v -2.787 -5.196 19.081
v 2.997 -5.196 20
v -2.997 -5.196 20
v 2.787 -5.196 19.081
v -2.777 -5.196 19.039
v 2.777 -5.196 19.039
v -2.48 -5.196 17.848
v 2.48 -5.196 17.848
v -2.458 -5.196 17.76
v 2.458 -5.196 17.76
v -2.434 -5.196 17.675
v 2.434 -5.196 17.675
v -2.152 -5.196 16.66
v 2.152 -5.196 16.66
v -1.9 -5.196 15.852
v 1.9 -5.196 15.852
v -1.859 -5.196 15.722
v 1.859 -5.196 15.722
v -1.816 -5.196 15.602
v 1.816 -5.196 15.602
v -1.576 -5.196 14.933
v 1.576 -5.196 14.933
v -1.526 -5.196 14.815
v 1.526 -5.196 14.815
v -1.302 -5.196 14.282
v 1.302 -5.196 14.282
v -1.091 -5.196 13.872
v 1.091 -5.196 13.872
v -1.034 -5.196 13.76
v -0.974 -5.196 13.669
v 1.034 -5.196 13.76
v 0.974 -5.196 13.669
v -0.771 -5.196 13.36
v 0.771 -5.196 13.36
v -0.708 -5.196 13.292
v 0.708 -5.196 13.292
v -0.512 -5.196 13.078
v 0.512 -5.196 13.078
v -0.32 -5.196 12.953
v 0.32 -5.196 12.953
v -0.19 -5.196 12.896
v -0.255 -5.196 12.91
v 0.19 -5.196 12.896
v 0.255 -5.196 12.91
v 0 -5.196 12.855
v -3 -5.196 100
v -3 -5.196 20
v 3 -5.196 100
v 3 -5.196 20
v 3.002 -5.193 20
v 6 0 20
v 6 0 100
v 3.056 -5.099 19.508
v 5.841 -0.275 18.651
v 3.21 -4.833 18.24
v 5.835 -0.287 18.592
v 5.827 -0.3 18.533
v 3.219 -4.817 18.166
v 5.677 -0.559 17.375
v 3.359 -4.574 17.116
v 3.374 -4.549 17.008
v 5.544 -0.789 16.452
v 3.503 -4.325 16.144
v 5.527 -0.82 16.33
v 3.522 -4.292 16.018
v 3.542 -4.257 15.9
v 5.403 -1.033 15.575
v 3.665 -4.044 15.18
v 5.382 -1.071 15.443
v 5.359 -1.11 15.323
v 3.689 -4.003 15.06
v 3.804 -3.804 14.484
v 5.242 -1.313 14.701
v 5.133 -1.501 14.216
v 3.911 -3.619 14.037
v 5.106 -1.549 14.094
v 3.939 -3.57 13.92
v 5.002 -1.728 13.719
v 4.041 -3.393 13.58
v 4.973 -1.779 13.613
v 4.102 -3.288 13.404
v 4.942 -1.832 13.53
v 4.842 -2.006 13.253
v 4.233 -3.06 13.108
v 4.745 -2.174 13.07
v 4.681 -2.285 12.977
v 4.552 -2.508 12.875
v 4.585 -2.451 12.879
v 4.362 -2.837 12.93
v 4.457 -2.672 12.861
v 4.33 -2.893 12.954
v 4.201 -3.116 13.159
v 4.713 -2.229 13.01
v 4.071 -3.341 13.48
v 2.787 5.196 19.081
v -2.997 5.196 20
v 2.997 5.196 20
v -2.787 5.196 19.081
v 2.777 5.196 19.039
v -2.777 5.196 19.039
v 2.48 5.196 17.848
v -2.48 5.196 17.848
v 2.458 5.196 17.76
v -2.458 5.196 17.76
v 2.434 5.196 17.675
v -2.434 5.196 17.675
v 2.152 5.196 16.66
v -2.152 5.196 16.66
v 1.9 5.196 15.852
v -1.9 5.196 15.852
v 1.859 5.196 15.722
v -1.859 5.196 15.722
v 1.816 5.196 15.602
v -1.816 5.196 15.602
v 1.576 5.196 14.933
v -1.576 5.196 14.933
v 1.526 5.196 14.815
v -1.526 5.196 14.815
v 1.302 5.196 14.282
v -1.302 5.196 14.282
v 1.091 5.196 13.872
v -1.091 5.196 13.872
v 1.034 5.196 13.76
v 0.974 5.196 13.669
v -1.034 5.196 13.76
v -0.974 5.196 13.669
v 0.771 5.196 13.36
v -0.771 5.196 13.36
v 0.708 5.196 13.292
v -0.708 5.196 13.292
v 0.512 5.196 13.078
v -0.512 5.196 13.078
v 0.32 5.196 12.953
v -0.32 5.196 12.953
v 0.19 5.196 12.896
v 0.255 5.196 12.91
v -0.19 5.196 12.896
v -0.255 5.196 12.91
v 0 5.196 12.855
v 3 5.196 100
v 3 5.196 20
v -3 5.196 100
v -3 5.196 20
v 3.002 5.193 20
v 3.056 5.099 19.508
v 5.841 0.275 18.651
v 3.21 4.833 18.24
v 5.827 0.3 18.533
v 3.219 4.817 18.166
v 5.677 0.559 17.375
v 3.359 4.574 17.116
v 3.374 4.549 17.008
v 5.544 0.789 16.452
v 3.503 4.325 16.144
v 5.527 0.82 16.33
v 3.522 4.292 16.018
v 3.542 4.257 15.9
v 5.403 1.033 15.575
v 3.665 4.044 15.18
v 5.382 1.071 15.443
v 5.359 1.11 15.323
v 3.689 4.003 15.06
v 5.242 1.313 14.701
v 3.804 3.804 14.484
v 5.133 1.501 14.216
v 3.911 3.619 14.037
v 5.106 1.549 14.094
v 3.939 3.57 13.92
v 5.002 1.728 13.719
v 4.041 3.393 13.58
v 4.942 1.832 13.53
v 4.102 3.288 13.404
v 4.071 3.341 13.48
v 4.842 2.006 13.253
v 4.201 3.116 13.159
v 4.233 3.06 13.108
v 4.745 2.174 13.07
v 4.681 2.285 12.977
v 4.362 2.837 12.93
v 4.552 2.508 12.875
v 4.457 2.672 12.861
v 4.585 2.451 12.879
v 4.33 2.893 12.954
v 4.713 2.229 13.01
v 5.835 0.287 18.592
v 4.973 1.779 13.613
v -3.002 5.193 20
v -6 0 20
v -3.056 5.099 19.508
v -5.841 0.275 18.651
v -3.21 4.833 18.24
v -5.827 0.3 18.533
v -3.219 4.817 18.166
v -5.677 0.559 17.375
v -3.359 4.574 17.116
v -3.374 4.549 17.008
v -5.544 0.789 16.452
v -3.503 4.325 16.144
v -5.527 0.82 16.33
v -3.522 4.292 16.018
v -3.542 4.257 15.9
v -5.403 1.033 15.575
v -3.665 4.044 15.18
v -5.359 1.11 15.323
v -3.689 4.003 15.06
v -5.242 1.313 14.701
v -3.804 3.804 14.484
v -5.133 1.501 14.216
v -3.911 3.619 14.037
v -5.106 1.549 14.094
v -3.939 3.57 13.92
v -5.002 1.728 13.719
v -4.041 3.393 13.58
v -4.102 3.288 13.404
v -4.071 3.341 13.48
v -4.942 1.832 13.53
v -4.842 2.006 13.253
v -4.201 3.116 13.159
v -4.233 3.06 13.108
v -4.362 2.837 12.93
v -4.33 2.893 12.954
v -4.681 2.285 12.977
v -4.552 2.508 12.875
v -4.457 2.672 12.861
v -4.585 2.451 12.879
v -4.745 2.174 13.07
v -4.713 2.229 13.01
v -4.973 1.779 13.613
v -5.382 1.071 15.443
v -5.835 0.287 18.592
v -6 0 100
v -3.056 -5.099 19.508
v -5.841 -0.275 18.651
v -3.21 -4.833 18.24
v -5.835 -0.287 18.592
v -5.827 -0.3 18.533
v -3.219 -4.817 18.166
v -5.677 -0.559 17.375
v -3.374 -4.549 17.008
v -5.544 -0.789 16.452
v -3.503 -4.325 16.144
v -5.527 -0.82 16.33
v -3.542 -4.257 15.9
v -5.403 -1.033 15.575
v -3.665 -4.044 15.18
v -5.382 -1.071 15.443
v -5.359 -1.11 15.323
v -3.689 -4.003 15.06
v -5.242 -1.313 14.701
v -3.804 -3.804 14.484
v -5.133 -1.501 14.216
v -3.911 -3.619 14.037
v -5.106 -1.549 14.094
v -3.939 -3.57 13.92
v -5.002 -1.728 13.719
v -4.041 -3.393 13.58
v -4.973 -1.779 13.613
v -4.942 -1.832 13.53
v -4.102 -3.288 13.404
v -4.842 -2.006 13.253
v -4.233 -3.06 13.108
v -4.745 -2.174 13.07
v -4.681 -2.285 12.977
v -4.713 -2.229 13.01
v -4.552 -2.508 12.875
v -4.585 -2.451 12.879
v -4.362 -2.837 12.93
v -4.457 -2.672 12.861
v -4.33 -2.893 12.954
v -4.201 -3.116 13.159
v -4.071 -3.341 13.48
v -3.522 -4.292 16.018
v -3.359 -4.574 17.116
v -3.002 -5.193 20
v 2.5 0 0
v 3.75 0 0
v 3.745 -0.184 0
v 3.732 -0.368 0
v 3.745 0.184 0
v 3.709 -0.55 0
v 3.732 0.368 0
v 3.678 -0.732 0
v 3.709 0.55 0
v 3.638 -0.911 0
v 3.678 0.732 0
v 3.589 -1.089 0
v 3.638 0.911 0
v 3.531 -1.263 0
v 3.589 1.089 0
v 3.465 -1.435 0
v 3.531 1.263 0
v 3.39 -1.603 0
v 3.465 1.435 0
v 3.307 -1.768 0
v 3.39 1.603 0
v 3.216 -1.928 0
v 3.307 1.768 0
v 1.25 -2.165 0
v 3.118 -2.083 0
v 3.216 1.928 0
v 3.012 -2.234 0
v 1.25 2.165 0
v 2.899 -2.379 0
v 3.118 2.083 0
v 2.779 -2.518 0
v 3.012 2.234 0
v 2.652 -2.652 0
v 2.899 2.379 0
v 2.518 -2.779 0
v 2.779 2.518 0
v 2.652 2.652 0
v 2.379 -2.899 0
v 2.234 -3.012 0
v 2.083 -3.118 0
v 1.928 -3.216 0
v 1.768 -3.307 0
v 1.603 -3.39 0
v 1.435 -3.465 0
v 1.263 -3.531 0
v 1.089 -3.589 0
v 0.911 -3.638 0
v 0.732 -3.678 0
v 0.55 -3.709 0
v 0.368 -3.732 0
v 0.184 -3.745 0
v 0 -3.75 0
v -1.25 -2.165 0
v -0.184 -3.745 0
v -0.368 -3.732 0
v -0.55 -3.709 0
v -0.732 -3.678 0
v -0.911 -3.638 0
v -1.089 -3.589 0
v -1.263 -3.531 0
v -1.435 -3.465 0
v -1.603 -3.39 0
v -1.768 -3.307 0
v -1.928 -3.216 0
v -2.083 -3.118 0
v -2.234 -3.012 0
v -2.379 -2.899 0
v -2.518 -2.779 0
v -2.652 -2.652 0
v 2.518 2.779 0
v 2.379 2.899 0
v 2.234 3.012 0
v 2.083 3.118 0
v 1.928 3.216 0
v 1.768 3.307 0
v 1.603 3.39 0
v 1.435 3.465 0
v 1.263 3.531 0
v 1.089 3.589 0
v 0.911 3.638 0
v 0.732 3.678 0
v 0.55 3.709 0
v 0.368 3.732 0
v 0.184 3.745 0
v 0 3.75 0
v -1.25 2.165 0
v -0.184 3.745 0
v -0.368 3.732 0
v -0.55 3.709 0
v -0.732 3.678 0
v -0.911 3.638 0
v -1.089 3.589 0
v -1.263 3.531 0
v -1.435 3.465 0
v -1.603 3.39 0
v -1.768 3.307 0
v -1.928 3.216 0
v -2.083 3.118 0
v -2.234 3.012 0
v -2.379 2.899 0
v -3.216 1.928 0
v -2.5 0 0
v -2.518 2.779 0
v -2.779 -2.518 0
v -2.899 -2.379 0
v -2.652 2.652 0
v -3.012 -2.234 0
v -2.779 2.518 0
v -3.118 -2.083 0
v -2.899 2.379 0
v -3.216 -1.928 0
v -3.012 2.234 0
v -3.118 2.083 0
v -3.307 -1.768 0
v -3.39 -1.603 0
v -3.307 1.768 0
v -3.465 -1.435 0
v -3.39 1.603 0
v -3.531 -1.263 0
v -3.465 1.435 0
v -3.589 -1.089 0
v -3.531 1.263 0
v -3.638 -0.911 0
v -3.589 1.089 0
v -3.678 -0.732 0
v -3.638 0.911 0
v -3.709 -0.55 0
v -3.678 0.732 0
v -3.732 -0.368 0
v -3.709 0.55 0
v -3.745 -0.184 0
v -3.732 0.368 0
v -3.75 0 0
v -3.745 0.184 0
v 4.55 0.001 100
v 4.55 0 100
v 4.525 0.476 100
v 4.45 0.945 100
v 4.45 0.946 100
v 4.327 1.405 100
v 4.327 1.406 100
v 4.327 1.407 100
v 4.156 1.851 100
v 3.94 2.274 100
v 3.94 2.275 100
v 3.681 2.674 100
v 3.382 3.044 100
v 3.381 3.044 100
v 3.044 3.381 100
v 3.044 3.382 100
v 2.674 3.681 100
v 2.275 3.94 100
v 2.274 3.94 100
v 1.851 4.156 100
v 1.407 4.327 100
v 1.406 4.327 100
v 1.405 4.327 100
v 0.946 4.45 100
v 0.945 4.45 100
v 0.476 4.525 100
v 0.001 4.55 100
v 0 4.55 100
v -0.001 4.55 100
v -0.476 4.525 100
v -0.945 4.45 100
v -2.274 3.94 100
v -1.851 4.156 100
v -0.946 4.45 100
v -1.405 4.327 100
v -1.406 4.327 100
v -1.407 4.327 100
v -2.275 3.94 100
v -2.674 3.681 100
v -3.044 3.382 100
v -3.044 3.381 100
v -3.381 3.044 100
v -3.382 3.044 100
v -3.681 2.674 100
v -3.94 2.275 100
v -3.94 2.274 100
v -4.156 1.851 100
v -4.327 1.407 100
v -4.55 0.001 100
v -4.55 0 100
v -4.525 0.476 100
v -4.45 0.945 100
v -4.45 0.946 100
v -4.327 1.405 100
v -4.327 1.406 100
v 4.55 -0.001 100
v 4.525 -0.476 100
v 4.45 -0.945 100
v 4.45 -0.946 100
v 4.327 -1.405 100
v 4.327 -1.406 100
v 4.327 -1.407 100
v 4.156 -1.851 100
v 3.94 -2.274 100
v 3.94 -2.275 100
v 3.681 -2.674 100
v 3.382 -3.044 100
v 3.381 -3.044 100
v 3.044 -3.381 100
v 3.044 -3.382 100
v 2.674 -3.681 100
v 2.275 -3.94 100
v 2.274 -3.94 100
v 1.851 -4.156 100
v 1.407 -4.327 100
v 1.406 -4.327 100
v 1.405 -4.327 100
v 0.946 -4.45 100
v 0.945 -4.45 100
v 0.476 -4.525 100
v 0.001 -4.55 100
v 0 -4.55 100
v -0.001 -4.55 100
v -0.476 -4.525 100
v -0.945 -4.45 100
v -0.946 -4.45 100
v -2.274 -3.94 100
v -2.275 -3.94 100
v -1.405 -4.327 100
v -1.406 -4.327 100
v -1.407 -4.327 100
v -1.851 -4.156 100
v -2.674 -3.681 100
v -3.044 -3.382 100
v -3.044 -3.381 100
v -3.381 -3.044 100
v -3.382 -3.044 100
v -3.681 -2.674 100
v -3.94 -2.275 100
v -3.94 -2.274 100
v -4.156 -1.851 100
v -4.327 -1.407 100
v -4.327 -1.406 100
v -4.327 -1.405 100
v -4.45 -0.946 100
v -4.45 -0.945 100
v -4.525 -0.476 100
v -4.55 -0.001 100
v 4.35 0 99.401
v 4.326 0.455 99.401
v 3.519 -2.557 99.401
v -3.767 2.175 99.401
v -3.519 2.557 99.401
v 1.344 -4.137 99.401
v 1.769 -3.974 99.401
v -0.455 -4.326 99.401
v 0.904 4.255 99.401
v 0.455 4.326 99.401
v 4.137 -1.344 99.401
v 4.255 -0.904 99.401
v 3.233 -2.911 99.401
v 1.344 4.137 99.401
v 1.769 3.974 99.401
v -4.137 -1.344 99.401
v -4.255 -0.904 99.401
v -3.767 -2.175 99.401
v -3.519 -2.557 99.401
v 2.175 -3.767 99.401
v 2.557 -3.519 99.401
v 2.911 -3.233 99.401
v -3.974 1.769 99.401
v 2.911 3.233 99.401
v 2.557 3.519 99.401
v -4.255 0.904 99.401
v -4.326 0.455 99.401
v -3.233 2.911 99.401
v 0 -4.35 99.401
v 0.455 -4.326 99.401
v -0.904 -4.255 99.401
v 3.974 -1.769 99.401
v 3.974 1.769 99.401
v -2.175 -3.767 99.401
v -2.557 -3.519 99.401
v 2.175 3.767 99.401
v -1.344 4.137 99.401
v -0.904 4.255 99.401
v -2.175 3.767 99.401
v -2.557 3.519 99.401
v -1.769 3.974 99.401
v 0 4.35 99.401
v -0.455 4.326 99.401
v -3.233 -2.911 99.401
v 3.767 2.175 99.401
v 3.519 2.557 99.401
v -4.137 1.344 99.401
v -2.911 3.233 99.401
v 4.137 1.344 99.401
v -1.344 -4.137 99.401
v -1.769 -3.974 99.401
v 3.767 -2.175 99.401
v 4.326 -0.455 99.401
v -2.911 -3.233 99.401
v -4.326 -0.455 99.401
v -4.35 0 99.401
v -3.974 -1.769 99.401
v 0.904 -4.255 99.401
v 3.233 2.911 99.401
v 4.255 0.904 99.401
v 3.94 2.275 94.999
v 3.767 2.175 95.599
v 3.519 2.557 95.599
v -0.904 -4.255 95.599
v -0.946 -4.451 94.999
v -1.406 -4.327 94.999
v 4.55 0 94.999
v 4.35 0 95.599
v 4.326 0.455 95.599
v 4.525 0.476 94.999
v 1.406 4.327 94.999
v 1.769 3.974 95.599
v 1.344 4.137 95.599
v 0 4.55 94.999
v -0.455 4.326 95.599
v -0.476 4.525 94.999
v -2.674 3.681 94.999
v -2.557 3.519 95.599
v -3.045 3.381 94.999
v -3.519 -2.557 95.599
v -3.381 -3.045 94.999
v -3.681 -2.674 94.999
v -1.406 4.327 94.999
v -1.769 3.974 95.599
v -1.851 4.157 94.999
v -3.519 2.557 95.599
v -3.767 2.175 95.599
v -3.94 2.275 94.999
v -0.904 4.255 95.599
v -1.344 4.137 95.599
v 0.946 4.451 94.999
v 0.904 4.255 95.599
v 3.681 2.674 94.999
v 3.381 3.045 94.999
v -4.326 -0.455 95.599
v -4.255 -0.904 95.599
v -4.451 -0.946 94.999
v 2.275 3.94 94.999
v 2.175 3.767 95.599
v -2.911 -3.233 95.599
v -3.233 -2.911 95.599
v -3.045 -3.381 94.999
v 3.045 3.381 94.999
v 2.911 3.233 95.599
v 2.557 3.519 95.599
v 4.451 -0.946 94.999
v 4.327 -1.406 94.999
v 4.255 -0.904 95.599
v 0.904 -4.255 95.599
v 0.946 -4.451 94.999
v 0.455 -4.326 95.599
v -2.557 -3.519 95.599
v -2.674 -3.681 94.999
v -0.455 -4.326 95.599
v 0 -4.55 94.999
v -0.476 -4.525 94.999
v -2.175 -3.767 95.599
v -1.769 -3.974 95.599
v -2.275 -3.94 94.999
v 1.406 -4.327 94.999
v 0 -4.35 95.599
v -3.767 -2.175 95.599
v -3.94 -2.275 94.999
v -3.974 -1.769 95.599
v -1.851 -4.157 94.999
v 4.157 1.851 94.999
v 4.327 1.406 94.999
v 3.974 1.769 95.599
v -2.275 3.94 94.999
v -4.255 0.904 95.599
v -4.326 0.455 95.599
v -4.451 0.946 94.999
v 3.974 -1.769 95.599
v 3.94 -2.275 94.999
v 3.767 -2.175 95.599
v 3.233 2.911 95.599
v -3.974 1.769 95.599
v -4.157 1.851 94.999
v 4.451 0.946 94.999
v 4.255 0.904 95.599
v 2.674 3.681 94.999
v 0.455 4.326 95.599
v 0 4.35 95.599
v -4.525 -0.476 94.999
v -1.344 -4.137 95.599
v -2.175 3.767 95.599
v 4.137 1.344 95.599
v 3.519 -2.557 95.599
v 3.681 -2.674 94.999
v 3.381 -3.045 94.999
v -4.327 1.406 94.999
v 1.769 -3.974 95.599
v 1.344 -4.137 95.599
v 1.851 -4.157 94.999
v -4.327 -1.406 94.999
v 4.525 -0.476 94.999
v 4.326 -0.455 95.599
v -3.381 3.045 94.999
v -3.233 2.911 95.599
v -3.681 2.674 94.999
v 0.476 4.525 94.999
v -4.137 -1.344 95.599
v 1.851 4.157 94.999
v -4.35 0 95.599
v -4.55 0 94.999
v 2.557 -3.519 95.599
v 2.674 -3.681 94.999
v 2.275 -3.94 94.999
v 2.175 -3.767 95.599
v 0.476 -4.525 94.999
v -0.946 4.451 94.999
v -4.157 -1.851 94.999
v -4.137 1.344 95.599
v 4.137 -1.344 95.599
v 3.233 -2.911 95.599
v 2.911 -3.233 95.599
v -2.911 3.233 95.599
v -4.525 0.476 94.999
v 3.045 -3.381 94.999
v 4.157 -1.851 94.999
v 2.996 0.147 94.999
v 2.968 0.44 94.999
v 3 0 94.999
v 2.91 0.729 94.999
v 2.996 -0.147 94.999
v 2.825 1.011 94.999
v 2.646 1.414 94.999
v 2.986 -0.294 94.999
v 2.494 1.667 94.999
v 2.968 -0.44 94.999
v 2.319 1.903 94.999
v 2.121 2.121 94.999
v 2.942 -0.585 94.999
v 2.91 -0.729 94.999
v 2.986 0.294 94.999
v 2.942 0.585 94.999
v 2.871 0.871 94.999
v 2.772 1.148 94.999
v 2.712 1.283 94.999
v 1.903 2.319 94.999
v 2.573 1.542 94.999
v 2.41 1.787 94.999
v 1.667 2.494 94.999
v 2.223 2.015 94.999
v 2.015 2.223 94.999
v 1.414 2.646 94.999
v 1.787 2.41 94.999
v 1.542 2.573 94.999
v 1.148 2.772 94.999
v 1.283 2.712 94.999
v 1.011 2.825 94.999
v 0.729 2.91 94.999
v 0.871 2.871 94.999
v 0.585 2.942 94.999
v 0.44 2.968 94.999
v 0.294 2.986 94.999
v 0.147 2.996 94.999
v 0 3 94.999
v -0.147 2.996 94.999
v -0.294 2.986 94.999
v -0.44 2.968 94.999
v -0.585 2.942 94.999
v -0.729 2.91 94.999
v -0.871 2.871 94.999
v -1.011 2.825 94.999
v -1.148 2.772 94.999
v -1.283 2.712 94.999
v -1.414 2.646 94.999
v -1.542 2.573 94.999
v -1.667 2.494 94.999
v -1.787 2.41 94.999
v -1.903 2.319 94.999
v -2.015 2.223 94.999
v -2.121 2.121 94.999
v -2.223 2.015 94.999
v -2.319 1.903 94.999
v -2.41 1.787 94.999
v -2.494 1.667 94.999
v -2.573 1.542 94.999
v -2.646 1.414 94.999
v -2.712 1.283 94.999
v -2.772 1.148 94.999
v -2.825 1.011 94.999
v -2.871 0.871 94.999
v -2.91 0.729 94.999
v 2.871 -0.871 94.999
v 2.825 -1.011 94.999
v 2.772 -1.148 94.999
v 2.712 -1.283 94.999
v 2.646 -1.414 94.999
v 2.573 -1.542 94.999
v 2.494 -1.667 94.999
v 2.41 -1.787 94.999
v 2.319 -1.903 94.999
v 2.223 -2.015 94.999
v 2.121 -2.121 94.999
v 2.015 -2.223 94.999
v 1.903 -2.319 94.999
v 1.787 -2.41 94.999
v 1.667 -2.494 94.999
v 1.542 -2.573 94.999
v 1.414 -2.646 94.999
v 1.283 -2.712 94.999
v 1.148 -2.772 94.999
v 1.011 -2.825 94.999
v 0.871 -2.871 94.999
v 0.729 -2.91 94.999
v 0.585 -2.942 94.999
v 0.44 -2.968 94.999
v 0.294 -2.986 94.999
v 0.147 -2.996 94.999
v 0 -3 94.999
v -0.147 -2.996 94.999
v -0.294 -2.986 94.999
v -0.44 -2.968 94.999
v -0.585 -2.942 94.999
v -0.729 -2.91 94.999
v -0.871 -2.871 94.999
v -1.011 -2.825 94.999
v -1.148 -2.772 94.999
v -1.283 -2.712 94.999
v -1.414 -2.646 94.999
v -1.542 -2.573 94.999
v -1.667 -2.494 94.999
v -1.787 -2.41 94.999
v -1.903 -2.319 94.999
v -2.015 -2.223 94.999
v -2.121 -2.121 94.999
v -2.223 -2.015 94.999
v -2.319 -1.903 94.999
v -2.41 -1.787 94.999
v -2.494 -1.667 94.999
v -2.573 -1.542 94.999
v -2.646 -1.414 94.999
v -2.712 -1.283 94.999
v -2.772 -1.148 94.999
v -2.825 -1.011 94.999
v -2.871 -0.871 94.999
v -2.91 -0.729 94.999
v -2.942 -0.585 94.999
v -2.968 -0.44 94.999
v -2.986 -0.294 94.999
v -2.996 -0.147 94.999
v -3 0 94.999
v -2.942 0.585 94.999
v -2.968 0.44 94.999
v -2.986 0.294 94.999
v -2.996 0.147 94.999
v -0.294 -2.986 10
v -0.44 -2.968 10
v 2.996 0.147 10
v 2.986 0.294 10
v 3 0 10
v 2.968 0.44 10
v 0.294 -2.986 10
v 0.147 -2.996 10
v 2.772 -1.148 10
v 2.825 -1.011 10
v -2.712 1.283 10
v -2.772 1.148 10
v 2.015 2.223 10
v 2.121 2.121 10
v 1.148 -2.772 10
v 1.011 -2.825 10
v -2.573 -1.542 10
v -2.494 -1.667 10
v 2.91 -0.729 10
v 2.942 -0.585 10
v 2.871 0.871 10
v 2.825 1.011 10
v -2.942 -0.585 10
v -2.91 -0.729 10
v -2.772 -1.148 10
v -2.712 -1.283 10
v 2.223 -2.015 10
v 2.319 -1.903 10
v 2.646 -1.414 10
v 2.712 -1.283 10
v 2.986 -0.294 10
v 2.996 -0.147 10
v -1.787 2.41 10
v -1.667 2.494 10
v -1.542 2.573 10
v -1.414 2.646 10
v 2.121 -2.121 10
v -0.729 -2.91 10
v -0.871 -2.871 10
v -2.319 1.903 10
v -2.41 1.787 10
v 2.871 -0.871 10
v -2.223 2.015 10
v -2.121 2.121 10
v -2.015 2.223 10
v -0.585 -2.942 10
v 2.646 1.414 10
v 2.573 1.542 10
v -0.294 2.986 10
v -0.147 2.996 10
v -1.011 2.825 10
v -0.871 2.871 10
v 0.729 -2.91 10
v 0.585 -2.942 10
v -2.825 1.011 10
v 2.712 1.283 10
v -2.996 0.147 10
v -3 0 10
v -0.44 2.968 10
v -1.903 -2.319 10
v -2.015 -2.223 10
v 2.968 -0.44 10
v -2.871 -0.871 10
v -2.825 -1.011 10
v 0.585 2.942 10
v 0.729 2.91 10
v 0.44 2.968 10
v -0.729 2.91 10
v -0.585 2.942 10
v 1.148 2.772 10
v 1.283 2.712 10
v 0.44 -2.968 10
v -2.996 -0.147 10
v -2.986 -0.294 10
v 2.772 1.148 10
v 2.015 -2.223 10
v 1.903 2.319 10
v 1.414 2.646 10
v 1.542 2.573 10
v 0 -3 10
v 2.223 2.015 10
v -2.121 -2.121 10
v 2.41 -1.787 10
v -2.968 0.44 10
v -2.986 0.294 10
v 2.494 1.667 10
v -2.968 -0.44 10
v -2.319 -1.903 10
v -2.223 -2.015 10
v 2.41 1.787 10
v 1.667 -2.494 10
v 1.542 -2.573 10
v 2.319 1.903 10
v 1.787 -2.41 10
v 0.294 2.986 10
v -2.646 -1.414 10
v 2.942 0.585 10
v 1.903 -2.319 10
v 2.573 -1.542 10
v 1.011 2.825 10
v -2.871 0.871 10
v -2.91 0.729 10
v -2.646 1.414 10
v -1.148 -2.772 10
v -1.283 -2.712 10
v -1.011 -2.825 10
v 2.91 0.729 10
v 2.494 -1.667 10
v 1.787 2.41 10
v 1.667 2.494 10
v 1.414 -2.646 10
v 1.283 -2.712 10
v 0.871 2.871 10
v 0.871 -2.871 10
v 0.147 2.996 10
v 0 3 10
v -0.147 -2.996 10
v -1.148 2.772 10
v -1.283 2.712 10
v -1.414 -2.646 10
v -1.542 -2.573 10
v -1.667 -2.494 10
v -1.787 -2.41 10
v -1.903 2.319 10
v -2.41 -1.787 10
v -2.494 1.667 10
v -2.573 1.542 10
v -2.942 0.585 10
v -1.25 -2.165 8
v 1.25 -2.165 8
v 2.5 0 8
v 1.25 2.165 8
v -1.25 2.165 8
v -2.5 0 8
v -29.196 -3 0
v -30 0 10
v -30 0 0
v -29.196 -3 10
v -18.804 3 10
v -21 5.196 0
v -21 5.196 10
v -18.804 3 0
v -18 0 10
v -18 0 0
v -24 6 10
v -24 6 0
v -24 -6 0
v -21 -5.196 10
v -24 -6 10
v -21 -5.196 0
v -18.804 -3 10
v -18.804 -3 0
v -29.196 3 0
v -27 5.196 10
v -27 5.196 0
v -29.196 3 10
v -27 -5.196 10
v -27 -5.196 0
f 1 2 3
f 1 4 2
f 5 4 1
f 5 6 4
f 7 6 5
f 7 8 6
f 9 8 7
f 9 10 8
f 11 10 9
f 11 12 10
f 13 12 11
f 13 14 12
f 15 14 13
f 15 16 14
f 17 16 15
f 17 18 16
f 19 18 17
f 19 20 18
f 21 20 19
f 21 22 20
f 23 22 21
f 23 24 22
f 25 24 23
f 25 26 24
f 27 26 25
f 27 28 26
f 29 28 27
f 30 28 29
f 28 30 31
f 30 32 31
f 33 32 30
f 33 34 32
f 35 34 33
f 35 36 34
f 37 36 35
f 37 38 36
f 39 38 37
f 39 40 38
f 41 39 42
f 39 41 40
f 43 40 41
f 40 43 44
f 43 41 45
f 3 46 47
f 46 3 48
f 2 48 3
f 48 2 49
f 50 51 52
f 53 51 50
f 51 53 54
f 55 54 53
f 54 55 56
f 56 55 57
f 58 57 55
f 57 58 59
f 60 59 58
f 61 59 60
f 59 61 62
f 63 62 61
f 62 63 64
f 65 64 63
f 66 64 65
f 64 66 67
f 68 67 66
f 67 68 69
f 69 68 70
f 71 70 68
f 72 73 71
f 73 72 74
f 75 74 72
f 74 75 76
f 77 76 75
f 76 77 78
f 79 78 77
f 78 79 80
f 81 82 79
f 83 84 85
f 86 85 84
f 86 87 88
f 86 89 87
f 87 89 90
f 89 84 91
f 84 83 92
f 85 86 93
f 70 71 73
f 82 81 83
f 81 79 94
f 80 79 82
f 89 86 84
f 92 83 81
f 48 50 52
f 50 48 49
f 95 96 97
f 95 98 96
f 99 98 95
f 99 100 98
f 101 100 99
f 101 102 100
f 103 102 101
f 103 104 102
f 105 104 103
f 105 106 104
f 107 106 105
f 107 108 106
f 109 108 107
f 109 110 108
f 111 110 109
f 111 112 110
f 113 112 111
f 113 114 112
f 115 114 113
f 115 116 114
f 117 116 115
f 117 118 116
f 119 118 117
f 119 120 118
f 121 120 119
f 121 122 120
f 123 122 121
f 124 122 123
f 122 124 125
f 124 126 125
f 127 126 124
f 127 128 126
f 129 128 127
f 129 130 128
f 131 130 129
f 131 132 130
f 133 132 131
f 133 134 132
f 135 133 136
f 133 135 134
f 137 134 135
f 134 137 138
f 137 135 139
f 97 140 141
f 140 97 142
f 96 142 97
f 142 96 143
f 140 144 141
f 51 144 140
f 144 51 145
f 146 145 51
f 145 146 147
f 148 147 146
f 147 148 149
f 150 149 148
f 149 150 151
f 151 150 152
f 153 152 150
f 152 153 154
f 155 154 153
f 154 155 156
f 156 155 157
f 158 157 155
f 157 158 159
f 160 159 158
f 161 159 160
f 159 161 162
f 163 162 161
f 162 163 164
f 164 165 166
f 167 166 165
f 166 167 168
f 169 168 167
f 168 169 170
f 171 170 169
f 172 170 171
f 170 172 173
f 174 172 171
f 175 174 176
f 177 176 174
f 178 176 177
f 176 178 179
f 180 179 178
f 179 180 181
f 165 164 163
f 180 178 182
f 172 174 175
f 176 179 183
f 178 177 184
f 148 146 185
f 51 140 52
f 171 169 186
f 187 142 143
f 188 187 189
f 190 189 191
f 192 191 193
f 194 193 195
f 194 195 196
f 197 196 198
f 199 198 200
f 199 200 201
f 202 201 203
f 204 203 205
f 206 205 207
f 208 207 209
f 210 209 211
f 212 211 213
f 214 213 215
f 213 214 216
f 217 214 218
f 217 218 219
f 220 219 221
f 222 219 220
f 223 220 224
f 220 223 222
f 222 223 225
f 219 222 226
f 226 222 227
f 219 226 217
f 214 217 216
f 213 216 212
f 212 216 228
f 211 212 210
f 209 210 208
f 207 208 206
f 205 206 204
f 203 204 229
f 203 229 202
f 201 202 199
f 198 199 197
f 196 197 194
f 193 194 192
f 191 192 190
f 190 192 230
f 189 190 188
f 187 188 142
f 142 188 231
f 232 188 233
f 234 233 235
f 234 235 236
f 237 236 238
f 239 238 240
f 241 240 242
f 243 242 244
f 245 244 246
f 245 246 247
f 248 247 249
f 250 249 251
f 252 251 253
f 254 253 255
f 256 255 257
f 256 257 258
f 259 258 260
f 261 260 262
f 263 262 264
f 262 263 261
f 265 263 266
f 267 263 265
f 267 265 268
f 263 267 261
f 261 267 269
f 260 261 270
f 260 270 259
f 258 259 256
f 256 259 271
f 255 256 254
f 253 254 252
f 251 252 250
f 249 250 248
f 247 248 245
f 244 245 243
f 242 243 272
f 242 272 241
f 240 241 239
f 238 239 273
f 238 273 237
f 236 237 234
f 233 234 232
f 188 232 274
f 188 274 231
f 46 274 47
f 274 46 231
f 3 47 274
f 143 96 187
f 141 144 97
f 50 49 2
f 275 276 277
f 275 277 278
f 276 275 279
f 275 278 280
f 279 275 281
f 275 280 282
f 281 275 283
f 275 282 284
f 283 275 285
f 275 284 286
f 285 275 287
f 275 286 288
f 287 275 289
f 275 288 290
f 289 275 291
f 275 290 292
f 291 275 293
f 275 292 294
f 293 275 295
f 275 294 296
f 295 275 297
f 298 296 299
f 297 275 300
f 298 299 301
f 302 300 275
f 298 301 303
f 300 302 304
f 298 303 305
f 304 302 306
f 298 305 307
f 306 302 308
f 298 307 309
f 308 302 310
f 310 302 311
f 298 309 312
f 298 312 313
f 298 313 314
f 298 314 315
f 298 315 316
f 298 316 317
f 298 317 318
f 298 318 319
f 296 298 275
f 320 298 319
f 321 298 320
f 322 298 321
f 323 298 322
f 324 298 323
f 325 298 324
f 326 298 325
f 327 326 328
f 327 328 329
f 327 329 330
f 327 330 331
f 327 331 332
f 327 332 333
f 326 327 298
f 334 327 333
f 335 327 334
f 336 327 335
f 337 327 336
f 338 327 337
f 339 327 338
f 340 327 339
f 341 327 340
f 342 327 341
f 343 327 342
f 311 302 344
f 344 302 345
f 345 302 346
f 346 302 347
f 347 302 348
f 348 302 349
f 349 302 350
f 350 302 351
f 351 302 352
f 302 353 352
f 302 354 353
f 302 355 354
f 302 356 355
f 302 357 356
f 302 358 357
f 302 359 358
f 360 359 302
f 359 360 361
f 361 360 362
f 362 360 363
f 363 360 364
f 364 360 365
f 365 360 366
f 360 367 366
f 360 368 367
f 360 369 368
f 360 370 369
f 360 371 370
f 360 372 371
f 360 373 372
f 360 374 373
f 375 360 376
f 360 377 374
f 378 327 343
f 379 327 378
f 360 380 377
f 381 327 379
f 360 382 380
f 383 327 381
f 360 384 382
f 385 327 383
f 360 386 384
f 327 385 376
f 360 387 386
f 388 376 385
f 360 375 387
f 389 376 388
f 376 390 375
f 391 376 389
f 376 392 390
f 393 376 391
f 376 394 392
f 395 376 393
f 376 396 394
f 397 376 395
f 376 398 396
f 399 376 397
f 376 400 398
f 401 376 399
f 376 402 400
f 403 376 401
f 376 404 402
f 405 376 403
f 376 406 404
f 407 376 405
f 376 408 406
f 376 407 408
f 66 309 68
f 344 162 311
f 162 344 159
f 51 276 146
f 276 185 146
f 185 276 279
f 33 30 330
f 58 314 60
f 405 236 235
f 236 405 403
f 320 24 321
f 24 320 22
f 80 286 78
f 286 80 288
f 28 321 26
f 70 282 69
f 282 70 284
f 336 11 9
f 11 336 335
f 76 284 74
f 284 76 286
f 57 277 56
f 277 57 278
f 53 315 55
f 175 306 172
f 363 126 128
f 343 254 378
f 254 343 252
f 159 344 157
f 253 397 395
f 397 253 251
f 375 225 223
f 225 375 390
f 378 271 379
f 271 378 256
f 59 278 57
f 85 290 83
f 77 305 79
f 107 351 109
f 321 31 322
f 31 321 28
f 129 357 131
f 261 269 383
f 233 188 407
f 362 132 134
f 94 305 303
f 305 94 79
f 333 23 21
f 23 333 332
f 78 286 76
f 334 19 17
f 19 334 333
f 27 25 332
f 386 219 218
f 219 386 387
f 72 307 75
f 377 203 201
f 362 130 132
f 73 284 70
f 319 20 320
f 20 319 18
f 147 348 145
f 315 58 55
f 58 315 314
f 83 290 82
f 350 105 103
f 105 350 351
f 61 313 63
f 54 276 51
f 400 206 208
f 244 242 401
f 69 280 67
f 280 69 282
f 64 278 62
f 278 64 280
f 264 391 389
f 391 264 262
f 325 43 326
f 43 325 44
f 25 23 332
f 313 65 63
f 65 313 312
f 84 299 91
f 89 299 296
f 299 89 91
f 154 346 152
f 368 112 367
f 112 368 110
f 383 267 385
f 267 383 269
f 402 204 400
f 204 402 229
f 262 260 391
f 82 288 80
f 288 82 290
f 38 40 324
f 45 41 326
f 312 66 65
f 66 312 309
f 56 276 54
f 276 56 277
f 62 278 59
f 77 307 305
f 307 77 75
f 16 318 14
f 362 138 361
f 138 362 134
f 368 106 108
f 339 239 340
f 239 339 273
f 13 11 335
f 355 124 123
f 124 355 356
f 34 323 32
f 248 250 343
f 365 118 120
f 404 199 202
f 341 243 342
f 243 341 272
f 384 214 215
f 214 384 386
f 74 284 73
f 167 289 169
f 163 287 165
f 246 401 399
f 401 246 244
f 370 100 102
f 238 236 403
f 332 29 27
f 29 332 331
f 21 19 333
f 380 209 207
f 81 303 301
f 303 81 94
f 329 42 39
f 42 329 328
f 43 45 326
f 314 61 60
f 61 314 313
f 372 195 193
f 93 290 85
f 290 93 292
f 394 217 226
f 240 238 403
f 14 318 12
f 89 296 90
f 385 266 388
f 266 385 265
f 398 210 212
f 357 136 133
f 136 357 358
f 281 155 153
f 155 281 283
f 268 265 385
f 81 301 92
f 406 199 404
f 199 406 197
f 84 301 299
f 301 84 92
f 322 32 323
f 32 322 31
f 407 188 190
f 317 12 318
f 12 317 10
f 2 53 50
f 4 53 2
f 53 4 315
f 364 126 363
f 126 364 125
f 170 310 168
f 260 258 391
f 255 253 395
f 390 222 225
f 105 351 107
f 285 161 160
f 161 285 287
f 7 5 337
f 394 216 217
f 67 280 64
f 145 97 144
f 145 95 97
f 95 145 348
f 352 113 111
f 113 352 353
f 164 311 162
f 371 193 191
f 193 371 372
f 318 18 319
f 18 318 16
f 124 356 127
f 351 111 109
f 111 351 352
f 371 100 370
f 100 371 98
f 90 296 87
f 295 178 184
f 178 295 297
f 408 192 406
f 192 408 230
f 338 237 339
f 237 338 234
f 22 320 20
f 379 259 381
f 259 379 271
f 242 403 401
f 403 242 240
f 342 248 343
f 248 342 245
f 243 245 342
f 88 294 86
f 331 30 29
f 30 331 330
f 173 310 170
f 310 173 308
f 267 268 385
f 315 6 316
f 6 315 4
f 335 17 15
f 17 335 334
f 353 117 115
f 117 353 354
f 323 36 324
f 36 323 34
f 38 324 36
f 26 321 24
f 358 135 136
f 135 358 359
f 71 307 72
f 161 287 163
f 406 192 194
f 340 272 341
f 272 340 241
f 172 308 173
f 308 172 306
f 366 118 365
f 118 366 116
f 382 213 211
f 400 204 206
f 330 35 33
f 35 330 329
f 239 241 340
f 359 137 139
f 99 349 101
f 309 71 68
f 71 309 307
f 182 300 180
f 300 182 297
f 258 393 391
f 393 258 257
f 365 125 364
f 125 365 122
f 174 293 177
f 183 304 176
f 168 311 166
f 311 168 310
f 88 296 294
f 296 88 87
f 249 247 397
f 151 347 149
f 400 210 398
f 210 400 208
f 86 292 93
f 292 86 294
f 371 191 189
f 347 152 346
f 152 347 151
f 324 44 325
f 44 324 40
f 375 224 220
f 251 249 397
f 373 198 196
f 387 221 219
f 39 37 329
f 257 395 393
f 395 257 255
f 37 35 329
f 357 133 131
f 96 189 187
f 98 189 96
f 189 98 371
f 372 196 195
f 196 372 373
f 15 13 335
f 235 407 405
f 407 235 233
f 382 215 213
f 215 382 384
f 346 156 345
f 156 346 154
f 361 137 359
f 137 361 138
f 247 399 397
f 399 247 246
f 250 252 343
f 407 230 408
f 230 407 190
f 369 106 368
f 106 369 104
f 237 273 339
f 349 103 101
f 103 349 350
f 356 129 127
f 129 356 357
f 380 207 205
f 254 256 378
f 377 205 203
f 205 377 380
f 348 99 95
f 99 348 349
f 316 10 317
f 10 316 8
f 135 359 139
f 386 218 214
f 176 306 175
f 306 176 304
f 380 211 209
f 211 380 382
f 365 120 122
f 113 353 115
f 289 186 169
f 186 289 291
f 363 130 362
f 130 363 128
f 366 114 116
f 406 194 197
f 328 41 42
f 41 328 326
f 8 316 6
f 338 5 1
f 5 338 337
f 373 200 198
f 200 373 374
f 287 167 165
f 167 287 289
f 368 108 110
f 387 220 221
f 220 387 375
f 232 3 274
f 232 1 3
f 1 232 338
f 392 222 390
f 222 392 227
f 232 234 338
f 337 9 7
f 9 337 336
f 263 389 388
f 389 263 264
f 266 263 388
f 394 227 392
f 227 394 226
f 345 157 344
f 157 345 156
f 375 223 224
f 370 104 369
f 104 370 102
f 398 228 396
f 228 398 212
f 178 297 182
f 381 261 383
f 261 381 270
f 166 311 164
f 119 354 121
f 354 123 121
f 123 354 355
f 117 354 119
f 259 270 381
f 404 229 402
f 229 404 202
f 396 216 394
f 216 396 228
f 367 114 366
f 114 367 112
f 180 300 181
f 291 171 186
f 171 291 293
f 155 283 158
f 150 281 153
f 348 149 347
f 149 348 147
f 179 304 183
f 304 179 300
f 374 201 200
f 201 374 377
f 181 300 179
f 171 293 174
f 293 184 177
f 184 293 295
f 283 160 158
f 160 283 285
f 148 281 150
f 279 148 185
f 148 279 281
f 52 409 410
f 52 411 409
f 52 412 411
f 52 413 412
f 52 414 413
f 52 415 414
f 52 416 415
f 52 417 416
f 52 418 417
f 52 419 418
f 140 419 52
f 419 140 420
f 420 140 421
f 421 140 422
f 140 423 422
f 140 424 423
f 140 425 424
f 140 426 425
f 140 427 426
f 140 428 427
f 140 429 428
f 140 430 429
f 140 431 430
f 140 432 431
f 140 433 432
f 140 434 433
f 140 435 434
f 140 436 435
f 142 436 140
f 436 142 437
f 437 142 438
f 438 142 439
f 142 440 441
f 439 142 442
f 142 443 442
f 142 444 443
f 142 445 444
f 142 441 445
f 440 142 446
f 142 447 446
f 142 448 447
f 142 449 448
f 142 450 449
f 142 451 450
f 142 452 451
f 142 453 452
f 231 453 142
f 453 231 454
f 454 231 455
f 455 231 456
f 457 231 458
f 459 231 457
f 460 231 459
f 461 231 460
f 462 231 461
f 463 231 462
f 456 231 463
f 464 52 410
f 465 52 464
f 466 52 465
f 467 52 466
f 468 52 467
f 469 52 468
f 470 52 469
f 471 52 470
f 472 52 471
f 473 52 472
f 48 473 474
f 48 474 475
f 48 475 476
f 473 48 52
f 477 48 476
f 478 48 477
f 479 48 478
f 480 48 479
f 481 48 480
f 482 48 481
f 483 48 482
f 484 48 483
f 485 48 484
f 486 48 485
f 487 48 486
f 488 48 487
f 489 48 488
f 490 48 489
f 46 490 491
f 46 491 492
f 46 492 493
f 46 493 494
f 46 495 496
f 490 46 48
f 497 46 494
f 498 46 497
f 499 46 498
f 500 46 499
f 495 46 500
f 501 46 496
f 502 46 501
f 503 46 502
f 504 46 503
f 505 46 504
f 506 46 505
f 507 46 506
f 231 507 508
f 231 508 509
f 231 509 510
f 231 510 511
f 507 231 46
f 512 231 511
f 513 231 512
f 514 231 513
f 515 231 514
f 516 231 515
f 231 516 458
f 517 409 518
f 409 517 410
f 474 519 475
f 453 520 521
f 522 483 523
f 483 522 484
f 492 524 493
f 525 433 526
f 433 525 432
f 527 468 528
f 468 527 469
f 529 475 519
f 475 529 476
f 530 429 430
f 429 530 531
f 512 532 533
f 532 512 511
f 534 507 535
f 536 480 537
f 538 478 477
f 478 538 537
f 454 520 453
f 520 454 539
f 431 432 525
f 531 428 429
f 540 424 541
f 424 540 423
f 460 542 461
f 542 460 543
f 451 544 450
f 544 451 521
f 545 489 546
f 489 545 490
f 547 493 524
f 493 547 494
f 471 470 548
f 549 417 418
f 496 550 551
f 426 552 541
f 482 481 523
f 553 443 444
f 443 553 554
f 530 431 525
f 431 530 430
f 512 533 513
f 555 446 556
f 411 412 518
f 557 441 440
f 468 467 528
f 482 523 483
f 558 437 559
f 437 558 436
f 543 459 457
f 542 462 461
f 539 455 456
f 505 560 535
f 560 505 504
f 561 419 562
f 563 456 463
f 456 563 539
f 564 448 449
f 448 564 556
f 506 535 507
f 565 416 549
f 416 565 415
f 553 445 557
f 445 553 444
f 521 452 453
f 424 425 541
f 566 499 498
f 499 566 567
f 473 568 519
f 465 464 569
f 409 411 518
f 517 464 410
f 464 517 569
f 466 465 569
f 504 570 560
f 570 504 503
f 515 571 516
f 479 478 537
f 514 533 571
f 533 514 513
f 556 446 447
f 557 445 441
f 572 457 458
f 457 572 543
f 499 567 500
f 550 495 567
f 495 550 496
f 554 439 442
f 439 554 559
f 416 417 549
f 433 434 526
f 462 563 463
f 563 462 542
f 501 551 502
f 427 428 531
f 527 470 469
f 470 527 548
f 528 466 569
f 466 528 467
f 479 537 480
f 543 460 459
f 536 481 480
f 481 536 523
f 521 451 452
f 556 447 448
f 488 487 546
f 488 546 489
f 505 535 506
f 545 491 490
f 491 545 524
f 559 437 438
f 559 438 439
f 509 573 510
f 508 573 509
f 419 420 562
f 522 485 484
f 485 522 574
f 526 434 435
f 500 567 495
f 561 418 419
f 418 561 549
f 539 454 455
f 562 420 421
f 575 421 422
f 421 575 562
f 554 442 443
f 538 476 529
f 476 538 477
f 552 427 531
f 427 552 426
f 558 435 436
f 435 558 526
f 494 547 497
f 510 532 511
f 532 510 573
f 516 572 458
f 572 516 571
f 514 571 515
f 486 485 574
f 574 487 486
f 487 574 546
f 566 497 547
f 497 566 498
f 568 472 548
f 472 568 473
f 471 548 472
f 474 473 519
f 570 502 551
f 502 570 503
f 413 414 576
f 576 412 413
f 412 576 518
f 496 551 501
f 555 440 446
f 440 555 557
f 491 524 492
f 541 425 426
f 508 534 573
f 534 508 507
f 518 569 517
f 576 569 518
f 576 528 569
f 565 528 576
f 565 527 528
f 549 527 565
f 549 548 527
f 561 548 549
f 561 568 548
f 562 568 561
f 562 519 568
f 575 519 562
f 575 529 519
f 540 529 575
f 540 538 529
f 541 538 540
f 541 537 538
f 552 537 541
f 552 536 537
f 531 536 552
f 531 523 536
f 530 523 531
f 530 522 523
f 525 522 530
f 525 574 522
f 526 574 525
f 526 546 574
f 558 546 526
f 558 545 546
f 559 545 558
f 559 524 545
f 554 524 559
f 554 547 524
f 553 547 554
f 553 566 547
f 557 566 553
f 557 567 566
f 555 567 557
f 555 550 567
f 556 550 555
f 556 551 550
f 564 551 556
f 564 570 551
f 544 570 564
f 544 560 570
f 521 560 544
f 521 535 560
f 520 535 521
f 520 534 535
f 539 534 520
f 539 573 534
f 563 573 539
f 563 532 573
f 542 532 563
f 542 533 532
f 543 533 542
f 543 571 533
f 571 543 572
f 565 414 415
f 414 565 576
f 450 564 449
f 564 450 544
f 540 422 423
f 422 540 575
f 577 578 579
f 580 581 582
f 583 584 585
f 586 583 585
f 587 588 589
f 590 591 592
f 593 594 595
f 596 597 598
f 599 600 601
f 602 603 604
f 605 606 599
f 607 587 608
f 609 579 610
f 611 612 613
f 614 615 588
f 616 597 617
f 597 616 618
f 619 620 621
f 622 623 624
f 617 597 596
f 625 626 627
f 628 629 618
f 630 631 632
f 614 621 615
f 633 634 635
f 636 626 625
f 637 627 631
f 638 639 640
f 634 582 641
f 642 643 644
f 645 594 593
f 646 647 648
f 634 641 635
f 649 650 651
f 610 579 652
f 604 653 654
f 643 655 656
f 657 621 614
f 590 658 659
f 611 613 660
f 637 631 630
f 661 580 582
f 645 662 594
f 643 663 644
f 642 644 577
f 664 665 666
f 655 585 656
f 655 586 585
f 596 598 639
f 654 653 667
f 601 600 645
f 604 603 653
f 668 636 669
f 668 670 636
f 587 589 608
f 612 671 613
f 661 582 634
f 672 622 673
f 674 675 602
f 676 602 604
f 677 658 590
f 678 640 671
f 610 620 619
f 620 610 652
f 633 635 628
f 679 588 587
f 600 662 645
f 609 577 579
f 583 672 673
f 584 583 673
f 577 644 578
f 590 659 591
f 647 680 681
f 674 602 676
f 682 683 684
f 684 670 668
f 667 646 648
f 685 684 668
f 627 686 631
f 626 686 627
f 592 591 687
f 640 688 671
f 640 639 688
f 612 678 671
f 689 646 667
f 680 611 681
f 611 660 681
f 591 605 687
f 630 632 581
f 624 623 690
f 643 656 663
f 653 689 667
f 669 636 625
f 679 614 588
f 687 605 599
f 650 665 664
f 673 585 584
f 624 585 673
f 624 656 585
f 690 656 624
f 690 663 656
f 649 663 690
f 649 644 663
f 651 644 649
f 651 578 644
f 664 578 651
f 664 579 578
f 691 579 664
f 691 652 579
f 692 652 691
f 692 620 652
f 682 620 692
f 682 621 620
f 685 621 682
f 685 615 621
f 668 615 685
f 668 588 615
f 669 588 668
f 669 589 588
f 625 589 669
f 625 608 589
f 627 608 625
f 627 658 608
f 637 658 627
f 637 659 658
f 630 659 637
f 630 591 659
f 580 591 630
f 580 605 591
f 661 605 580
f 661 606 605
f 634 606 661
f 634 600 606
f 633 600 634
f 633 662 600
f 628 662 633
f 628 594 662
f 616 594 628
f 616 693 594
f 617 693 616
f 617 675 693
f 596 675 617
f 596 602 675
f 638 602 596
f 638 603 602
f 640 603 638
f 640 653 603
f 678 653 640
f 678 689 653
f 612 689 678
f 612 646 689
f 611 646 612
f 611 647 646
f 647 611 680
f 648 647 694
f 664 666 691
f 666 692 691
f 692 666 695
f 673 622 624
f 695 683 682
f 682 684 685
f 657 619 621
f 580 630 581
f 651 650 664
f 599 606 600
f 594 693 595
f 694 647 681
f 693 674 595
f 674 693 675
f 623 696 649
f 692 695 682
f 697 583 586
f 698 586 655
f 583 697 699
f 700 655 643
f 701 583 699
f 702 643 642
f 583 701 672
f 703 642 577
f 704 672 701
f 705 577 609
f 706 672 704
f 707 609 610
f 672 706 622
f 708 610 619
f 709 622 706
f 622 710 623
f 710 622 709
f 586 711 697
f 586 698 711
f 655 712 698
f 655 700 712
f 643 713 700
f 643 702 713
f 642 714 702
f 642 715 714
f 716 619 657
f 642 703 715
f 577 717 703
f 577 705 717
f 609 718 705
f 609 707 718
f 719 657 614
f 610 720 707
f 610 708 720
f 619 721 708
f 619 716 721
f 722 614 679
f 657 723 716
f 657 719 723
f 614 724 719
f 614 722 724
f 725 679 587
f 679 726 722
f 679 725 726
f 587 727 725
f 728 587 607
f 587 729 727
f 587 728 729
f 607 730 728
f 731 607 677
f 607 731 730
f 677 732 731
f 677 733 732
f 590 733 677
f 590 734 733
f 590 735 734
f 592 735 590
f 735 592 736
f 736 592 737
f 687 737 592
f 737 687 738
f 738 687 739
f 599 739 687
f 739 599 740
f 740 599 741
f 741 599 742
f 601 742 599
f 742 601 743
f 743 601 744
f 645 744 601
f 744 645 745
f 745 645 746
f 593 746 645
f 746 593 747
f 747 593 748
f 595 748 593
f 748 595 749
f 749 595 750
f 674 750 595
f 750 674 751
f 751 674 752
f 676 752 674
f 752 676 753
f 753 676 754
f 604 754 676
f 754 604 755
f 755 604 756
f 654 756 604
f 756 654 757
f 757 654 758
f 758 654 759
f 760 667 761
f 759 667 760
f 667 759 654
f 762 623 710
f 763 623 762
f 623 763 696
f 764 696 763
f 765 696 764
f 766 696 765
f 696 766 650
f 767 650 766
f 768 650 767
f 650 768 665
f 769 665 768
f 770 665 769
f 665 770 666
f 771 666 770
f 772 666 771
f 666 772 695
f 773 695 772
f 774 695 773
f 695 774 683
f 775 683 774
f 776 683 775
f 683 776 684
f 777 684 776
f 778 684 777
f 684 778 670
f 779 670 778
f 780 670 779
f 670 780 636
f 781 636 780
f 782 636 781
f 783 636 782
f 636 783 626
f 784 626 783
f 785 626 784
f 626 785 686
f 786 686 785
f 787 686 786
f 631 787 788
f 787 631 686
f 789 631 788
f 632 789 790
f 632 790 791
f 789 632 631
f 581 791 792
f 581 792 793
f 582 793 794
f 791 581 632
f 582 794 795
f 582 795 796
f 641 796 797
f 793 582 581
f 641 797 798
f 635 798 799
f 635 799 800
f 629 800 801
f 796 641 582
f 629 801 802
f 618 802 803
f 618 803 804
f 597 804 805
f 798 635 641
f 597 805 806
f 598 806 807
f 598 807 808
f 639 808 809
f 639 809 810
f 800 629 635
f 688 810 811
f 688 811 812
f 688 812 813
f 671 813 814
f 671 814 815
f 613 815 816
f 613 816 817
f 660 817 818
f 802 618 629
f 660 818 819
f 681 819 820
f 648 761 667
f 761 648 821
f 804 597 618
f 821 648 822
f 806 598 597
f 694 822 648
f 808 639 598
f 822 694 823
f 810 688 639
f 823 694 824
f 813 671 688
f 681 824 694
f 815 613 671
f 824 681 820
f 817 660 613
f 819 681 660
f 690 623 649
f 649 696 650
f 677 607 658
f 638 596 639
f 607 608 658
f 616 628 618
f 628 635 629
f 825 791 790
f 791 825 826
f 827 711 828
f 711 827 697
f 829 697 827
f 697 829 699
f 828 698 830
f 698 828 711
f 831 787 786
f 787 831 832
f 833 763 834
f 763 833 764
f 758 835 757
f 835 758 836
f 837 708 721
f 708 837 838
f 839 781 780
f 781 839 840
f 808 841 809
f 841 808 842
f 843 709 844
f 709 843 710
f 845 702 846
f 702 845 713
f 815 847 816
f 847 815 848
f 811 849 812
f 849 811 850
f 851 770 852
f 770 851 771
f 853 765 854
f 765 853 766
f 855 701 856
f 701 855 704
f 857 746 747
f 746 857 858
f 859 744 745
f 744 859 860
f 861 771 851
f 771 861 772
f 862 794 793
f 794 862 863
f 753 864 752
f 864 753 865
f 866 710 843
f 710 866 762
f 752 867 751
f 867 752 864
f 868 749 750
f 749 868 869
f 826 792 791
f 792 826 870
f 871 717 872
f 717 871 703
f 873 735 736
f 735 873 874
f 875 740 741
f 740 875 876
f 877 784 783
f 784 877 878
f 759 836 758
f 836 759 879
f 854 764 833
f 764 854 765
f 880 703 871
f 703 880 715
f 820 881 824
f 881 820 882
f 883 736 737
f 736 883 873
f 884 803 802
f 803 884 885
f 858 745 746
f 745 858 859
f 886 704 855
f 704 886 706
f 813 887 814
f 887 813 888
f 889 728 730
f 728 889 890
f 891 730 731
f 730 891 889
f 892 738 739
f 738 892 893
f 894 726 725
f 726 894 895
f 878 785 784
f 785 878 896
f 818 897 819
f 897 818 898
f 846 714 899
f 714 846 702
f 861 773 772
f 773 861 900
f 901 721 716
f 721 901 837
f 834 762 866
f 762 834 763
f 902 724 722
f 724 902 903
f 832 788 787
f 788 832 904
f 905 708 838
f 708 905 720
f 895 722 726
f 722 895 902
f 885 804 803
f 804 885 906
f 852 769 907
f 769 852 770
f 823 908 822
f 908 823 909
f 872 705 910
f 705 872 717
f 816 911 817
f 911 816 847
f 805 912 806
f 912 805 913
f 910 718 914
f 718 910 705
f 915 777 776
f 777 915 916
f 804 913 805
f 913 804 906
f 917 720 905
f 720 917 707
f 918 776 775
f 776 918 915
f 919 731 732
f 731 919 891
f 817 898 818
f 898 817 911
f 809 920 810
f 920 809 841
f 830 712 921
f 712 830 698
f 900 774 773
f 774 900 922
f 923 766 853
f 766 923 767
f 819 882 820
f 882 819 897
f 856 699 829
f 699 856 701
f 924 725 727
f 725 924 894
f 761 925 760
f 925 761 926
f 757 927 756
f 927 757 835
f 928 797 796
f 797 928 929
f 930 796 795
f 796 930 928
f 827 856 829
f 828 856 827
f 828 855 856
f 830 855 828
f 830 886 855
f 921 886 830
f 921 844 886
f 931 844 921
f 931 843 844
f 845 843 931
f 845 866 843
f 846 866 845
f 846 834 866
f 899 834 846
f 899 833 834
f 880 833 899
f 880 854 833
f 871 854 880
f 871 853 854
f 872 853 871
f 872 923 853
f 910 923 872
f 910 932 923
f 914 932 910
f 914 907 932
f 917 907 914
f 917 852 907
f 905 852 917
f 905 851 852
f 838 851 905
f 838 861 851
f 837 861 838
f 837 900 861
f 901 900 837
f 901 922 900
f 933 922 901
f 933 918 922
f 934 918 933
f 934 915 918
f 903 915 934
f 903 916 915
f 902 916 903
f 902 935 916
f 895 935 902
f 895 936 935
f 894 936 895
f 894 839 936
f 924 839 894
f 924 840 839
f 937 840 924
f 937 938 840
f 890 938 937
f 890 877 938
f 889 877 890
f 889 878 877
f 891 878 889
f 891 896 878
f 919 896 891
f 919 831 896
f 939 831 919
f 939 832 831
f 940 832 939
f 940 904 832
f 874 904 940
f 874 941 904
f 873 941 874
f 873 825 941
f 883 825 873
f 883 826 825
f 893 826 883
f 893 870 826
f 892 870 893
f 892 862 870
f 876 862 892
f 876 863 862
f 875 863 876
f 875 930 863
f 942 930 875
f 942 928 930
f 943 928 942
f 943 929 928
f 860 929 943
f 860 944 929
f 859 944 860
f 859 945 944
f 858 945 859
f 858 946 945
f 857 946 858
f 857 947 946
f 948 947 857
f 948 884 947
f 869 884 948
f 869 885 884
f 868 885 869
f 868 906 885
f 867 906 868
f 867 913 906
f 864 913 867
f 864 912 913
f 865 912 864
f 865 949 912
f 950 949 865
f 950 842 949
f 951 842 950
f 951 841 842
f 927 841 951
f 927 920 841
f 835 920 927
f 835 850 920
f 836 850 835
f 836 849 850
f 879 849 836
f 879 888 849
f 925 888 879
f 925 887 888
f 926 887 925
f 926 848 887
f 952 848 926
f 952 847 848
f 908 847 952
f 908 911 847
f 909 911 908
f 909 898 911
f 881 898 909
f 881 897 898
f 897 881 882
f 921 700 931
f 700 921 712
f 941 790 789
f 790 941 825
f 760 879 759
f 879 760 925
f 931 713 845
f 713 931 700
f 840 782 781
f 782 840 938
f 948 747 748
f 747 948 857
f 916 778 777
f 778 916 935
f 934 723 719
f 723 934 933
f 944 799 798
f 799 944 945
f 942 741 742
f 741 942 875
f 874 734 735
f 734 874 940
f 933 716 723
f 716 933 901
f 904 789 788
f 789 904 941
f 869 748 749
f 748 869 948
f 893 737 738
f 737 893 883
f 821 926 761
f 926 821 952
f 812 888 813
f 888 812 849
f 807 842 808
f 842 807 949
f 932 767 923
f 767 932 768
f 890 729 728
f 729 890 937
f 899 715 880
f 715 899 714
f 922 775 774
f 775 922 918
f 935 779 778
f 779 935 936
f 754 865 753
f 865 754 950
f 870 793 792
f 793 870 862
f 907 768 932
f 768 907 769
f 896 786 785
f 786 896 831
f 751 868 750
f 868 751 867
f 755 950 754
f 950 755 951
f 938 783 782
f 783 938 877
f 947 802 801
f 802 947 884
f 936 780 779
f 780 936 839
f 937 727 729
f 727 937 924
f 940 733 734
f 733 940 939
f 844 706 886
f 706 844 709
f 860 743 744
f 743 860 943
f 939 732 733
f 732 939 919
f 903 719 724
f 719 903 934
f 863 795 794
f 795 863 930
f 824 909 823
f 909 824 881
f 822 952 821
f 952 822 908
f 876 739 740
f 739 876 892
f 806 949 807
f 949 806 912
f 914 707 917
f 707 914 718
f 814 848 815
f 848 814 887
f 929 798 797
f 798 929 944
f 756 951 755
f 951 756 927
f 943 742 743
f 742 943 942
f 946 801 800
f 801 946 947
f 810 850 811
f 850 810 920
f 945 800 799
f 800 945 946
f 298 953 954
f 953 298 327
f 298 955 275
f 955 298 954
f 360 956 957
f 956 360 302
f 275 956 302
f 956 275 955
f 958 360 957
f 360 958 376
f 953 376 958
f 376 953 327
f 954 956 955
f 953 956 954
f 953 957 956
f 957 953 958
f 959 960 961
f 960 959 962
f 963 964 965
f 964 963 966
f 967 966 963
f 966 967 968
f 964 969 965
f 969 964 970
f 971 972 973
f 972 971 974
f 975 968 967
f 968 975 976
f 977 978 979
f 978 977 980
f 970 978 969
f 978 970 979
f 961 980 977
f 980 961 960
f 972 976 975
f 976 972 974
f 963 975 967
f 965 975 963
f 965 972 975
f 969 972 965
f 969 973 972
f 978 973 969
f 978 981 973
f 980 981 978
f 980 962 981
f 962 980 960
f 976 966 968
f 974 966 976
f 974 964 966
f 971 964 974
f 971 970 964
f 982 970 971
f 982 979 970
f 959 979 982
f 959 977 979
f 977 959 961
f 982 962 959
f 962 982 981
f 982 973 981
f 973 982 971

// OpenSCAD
/*
 * screw-driver.scad
 * bit を 2、3 個収納できる、ペン型のドライバー軸
 * bit は、5mm径六角形、28mm長

 * MIT License
 *
 * Copyright (c) 2024 KAWABATA, Kazumichi
 *
 * Permission is hereby granted, free of charge, to any person obtaining a copy
 * of this software and associated documentation files (the "Software"), to deal
 * in the Software without restriction, including without limitation the rights
 * to use, copy, modify, merge, publish, distribute, sublicense, and/or sell
 * copies of the Software, and to permit persons to whom the Software is
 * furnished to do so, subject to the following conditions:
 *
 * The above copyright notice and this permission notice shall be included in all
 * copies or substantial portions of the Software.
 *
 * THE SOFTWARE IS PROVIDED "AS IS", WITHOUT WARRANTY OF ANY KIND, EXPRESS OR
 * IMPLIED, INCLUDING BUT NOT LIMITED TO THE WARRANTIES OF MERCHANTABILITY,
 * FITNESS FOR A PARTICULAR PURPOSE AND NONINFRINGEMENT. IN NO EVENT SHALL THE
 * AUTHORS OR COPYRIGHT HOLDERS BE LIABLE FOR ANY CLAIM, DAMAGES OR OTHER
 * LIABILITY, WHETHER IN AN ACTION OF CONTRACT, TORT OR OTHERWISE, ARISING FROM,
 * OUT OF OR IN CONNECTION WITH THE SOFTWARE OR THE USE OR OTHER DEALINGS IN THE
 * SOFTWARE.

 */


use <threads-library-by-cuiso-v1.scad>
/*
 * OpenScad library. Threads for screws and nuts V1
 * by Cuiso is licensed under the Creative Commons - Attribution license.
 * https://www.thingiverse.com/thing:3131126
 */

// Quality
$fn = 128;

bit_dia = 5;    // bit 直径
bit_len = 28;   // bit 全長
bit_dep = 8;    // bit 差し込む穴の深さ

wall=1.25;       // 壁の厚さ。ペン先が薄くなりすぎないように

screw_dia = 8;  // 蓋のネジ穴の直径
screw_len = 5; // 蓋のネジ穴の深さ

pen_dia = 12;   // ペン軸の直径
pen_len = 100;  // ペン軸の長さ

cap_len = 10;   // 蓋の長さ（ネジ部分除く）
cap_dia = pen_dia;  // 蓋の直径

hall_dia = bit_dia + 1;      // bit 収納穴の直径
hall_len = bit_len * 3 + 1;  // bit 収納穴の深さ

nibs_dia = bit_dia + wall * 2; // ペン先の直径
nibs_len = 20;                 // ペン先部分の長さ

translate([0, 0, 0])
    difference() {
        // 外形
        difference() {
            cylinder(d=pen_dia, h=pen_len, $fn=6);
            difference(){
                cylinder(d=pen_dia, h=nibs_len, $fn=6);
                cylinder(r1=nibs_dia/2, r2=pen_dia/2, h=nibs_len);
            }
        }
        // 空洞
        translate([0, 0, pen_len-screw_len-hall_len])
            cylinder(d=hall_dia, h=hall_len);
        // ねじ山
        translate([0, 0, pen_len-screw_len])
            thread_for_nut_fullparm(diameter=screw_dia, length=screw_len, pitch=2,    usrclearance=0.1);
        // bit 差し込み穴
        cylinder(r=bit_dia/2, h=bit_dep, $fn=6);

        // 穴調整のため断面見たい時用。
//        translate([-pen_dia/2, -pen_dia/2, 0])
//            cube([pen_dia, pen_dia/2, pen_len]);
    }


// ふた
translate([-pen_dia * 2, 0, 0])
    union(){
        thread_for_screw_fullparm(diameter=screw_dia, length=screw_len+cap_len, pitch=2); 
        cylinder(d=cap_dia, h=cap_len, $fn=12);
    }
 
